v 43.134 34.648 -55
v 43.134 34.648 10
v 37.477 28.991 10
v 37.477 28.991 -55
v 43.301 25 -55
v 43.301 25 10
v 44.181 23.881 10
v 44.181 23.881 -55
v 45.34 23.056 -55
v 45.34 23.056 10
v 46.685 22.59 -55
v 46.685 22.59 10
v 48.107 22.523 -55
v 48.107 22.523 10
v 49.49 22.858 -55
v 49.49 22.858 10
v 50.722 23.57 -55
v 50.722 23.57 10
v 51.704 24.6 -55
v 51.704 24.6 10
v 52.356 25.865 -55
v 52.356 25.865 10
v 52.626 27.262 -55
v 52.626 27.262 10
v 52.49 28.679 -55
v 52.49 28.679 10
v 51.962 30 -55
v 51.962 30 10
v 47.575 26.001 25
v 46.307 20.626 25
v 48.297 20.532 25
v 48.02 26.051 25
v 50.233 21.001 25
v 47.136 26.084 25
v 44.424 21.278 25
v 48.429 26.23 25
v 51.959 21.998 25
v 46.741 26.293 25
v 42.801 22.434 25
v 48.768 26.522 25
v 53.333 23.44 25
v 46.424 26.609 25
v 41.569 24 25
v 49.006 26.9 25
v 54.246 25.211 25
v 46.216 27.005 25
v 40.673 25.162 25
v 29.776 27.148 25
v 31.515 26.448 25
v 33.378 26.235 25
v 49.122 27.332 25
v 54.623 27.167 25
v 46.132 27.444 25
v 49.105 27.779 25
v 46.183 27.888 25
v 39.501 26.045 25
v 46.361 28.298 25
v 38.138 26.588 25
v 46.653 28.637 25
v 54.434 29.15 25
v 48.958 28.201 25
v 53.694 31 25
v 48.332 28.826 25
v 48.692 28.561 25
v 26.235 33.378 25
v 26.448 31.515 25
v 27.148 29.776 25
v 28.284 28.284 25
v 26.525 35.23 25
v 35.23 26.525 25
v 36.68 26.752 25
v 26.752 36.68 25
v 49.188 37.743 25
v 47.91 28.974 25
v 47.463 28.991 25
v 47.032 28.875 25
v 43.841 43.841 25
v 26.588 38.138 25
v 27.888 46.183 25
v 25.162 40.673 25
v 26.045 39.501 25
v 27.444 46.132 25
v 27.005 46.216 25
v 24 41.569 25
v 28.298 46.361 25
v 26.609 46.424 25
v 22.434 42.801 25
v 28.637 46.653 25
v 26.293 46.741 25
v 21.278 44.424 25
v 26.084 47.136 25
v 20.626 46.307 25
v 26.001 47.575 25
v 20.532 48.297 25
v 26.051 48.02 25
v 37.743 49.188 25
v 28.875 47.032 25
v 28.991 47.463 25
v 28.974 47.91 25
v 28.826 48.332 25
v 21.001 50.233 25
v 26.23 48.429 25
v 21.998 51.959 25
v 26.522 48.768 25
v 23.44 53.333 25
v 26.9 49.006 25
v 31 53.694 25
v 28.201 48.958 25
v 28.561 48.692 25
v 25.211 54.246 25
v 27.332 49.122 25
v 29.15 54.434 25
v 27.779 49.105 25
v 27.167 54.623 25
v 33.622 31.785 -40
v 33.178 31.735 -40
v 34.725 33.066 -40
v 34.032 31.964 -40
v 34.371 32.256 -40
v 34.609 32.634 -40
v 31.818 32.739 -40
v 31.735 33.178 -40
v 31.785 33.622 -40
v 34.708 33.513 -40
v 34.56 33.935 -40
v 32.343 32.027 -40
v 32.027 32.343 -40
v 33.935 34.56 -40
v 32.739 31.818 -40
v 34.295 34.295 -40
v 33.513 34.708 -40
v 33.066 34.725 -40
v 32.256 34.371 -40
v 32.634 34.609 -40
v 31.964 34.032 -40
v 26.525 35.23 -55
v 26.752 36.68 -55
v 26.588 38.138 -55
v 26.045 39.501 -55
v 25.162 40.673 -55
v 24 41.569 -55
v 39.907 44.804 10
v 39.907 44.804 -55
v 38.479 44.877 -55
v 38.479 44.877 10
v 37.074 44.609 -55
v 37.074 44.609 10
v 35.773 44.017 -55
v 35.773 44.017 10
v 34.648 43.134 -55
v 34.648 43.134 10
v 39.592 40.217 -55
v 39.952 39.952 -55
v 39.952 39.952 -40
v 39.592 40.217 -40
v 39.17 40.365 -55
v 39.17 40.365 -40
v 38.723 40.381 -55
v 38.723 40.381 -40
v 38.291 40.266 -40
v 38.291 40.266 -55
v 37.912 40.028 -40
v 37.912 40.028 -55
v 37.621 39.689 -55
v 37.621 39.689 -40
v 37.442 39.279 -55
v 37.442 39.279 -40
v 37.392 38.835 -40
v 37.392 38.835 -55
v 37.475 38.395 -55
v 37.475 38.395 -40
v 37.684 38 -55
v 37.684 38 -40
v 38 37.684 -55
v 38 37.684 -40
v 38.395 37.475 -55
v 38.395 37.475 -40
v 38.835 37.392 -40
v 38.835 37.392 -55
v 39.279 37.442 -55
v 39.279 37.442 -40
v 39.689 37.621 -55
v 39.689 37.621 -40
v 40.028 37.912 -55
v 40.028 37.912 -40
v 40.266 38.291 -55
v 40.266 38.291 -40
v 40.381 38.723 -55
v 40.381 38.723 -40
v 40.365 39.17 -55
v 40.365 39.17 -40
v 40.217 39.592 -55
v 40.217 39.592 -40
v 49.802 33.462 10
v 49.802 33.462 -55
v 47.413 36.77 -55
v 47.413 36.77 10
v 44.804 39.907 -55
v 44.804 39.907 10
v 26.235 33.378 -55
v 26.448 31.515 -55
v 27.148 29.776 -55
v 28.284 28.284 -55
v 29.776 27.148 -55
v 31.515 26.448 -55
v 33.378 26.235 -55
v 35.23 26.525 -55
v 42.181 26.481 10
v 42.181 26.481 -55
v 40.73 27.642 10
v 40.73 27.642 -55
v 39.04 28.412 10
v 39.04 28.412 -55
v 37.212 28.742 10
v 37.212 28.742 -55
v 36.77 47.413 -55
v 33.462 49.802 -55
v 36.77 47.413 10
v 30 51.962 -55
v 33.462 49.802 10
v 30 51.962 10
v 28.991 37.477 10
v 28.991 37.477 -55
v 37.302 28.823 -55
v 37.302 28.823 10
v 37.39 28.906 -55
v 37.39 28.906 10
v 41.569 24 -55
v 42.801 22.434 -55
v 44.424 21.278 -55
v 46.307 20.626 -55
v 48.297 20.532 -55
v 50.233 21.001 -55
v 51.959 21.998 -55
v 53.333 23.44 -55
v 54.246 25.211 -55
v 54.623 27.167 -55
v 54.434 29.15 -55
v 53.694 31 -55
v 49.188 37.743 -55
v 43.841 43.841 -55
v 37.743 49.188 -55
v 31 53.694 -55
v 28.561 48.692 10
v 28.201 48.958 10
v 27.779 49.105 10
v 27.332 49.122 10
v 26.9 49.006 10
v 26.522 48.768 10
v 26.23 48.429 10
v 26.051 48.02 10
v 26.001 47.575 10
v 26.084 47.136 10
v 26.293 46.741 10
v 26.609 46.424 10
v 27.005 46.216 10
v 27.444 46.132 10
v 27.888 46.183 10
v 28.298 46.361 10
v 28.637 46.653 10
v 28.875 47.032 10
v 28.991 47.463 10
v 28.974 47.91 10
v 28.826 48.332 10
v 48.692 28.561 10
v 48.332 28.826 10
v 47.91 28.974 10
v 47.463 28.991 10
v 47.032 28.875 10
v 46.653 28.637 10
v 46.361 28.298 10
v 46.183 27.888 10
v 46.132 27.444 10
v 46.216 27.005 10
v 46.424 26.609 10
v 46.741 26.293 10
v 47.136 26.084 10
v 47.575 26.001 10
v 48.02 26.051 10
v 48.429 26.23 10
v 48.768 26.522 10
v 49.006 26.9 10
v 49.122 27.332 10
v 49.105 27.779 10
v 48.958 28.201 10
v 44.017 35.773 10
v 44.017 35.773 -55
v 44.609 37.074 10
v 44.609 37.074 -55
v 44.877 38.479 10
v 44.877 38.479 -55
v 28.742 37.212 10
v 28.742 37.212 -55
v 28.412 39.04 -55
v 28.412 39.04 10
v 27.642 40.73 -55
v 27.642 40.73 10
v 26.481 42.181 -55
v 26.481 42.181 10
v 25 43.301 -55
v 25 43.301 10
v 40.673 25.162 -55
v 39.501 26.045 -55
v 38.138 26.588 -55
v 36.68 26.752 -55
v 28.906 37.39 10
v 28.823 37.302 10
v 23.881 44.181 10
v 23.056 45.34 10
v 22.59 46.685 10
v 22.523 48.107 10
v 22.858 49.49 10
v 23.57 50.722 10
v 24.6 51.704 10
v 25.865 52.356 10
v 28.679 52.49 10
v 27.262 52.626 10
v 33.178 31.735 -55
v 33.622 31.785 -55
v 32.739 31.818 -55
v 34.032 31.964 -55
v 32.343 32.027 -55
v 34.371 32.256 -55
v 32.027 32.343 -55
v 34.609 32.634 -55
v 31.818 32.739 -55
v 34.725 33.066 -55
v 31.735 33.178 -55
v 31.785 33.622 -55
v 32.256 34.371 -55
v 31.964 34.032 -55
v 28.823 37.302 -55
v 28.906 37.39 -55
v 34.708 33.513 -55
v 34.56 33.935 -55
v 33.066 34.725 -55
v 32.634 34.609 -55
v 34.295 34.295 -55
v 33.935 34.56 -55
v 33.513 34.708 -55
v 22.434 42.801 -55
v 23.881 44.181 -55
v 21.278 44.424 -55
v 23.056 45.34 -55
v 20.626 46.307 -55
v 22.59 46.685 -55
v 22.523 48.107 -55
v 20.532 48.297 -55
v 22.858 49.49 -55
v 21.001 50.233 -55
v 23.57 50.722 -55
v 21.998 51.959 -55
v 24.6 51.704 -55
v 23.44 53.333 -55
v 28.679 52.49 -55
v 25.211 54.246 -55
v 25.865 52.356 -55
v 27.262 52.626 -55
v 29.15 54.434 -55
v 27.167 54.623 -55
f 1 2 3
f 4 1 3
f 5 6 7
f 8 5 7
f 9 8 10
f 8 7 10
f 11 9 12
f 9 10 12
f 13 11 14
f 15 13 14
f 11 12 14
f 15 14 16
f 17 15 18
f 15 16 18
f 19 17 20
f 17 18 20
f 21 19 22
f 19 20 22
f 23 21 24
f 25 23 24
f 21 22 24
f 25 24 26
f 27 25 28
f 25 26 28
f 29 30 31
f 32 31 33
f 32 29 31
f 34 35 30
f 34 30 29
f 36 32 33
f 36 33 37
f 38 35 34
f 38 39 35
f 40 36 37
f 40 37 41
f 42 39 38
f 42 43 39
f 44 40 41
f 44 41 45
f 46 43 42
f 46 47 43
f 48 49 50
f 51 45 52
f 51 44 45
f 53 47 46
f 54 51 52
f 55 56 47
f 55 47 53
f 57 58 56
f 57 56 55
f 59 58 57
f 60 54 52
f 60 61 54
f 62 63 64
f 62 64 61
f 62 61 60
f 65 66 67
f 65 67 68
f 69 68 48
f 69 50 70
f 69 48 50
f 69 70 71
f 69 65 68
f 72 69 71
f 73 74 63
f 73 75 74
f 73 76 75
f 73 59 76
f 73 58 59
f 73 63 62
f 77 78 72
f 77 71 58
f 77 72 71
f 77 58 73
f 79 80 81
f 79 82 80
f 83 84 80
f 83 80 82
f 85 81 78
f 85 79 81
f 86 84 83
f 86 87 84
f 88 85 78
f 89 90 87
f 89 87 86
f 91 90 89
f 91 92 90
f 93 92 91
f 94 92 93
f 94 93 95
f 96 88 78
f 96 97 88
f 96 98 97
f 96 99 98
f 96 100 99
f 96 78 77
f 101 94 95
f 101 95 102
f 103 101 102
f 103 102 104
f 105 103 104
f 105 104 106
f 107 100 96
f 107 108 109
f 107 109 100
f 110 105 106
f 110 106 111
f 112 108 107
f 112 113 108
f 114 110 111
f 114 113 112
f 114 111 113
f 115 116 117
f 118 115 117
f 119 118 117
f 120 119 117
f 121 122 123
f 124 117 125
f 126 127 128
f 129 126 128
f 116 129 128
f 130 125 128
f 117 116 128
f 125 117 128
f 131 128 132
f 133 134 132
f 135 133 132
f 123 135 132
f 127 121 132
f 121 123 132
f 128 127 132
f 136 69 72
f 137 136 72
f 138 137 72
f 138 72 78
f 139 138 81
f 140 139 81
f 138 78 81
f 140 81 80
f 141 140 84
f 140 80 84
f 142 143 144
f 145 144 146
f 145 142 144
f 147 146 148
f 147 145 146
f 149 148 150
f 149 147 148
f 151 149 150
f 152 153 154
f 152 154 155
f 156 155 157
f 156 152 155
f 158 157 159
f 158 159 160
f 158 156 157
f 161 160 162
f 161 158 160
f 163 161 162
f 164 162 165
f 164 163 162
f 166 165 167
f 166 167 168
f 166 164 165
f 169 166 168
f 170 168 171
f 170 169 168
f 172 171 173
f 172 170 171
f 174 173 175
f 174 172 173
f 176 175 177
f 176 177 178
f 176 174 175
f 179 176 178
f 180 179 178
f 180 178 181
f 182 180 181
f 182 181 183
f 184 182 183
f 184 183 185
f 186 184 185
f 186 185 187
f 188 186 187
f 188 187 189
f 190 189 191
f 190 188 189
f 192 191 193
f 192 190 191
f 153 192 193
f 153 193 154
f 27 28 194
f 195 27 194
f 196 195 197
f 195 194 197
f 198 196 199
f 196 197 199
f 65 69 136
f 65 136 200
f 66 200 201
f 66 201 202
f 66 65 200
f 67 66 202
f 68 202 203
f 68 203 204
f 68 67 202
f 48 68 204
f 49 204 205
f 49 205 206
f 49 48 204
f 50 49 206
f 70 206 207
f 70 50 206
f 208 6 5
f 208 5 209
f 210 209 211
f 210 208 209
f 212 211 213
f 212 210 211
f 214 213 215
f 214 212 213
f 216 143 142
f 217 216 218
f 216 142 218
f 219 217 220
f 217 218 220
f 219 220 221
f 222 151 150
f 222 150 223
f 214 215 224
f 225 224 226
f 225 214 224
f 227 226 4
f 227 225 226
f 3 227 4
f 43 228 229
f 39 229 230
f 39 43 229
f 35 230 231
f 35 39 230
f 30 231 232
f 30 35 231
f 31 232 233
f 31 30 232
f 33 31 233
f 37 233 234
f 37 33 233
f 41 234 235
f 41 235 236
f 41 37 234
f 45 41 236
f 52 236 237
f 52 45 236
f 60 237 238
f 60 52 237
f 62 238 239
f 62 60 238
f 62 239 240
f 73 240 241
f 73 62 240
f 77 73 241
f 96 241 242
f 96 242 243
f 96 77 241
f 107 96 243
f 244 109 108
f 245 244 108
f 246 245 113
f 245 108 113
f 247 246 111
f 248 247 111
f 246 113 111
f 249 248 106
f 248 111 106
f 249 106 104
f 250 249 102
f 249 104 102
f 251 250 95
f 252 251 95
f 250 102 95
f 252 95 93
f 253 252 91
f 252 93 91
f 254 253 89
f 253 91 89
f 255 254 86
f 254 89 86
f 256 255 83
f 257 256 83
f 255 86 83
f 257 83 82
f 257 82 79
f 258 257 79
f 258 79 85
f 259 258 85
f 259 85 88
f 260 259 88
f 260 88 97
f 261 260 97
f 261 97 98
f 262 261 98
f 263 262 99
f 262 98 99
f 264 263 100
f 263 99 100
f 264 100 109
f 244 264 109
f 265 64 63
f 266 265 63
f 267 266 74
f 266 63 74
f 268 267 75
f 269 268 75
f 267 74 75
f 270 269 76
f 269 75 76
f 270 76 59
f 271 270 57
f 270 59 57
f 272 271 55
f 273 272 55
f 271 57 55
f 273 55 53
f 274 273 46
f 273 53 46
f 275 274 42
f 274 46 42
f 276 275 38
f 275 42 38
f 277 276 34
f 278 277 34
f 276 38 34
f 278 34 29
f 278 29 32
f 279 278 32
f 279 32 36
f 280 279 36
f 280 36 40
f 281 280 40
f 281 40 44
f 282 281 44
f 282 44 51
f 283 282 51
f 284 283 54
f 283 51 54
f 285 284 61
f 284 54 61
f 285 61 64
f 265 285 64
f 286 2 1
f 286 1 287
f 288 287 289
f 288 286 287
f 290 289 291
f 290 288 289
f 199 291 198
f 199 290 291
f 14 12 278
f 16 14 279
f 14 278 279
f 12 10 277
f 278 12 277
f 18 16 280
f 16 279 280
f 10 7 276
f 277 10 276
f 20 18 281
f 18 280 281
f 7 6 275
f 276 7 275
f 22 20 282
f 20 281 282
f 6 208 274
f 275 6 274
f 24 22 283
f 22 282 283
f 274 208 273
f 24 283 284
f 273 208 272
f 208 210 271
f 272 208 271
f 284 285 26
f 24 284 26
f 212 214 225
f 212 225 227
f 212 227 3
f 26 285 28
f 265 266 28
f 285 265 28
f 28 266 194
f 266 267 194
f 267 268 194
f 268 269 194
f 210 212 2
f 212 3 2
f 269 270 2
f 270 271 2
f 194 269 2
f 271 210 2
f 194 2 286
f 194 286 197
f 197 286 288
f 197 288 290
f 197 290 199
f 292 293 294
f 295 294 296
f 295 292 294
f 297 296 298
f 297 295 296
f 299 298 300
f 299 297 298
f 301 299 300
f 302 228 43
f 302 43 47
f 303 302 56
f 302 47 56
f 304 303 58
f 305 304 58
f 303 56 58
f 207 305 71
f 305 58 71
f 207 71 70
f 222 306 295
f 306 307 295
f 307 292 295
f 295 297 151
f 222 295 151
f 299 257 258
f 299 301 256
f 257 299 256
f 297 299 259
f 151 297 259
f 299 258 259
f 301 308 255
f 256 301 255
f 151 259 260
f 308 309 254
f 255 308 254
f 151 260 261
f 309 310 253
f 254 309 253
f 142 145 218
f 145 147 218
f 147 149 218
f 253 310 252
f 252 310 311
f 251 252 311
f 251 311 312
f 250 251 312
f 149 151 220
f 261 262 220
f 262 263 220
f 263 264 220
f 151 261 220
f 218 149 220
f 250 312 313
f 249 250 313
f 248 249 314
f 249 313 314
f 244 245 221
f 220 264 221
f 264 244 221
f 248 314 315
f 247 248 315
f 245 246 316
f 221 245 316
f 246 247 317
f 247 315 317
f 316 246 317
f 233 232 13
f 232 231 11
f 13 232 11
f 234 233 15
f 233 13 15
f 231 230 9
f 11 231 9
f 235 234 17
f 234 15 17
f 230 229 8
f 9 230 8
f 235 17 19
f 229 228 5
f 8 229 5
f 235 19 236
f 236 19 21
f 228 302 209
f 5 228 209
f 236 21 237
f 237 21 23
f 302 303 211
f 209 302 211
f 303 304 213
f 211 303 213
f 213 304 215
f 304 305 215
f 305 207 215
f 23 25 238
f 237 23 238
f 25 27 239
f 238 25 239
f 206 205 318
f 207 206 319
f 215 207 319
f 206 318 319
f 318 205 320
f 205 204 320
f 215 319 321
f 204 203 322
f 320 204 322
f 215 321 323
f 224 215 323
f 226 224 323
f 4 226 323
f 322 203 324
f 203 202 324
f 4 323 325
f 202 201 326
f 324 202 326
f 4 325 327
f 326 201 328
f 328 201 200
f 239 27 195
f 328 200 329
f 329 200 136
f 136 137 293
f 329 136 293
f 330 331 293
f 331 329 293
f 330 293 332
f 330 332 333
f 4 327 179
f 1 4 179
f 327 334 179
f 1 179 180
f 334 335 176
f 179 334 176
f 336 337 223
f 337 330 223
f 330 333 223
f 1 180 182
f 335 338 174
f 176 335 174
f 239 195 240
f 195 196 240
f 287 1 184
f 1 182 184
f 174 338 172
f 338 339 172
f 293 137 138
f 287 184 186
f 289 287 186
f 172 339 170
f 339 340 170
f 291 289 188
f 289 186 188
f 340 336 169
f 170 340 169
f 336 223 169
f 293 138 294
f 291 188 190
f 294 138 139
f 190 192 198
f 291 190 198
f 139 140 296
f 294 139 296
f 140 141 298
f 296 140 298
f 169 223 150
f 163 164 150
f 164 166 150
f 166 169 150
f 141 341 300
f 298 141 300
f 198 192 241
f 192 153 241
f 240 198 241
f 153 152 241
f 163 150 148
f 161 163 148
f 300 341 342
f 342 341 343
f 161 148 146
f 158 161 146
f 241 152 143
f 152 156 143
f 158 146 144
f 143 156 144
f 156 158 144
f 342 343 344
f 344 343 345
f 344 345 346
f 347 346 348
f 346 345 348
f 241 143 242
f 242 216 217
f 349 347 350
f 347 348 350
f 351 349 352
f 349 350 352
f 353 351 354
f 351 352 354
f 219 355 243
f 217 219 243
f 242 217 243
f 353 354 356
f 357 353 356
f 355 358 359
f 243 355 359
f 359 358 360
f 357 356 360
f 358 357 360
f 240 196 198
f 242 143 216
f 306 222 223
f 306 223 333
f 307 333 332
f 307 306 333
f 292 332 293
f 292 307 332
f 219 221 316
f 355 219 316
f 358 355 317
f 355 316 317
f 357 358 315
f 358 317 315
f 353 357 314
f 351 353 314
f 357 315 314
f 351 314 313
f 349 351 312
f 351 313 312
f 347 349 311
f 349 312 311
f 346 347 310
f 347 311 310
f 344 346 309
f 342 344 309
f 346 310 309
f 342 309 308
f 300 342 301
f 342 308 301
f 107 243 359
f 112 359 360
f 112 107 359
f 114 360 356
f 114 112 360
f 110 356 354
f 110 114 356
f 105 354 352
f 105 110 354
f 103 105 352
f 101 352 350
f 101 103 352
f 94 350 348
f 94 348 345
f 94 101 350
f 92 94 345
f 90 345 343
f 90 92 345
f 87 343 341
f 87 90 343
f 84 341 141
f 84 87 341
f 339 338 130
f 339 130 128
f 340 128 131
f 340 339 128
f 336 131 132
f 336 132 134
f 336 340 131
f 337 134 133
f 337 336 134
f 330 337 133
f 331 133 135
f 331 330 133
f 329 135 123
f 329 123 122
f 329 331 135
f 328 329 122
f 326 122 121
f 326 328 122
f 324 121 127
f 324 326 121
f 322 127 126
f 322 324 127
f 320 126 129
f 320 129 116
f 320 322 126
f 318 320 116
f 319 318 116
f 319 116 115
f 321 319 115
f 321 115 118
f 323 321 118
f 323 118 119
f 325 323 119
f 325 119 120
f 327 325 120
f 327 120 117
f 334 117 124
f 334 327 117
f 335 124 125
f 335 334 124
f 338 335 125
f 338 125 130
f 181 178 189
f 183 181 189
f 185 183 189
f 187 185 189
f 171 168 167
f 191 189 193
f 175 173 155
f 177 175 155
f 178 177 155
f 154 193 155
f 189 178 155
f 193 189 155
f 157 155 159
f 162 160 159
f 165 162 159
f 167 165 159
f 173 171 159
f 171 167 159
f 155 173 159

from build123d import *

# Parameters (mm, degrees)
SKETCH020_R             = 1.5
PAD013_DEPTH            = 15
PAD014_DEPTH            = 80
PAD015_DEPTH            = 80
SKETCH023_R             = 1.5
POCKET005_DEPTH         = 15
BODY003_PLACEMENT_ANGLE = 45


with BuildPart() as part:
    # Sketch020 → Pad013 (new body)
    with BuildSketch(Plane.XY):
        with BuildLine():
            ThreePointArc((59.887401, -16.046781), (62, 0), (59.887401, 16.046781))
            ThreePointArc((59.887401, 16.046781), (51.314187, 20.996528), (46.36444, 12.423314))
            ThreePointArc((43.66723, 6.1557), (46.103592, 8.821401), (46.36444, 12.423314))
            ThreePointArc((43.66723, 6.1557), (40, 0), (43.66723, -6.1557))
            ThreePointArc((46.36444, -12.423314), (46.103592, -8.821401), (43.66723, -6.1557))
            ThreePointArc((46.36444, -12.423314), (51.314187, -20.996528), (59.887401, -16.046781))
        make_face()
        with Locations((53.12592, 14.235047)):
            Circle(SKETCH020_R, mode=Mode.SUBTRACT)
        with Locations((53.12592, -14.235047)):
            Circle(SKETCH020_R, mode=Mode.SUBTRACT)
    extrude(amount=-PAD013_DEPTH)

    # Sketch021 → Pad014 (join)
    with BuildSketch(Plane.XY):
        with BuildLine():
            ThreePointArc((59.887401, -16.046781), (62, 0), (59.887401, 16.046781))
            ThreePointArc((59.887401, 16.046781), (51.314187, 20.996528), (46.36444, 12.423314))
            ThreePointArc((43.66723, 6.1557), (46.103592, 8.821401), (46.36444, 12.423314))
            ThreePointArc((43.66723, 6.1557), (40, 0), (43.66723, -6.1557))
            ThreePointArc((46.36444, -12.423314), (46.103592, -8.821401), (43.66723, -6.1557))
            ThreePointArc((46.36444, -12.423314), (51.314187, -20.996528), (59.887401, -16.046781))
        make_face()
        with BuildLine():
            ThreePointArc((57.95555, 15.529143), (51.831825, 19.064677), (48.296291, 12.940952))
            ThreePointArc((44.61945, 4.396929), (47.940703, 8.030817), (48.296291, 12.940952))
            ThreePointArc((44.61945, 4.396929), (42, 0), (44.61945, -4.396929))
            ThreePointArc((48.296291, -12.940952), (47.940703, -8.030817), (44.61945, -4.396929))
            ThreePointArc((48.296291, -12.940952), (51.831825, -19.064677), (57.95555, -15.529143))
            ThreePointArc((57.95555, -15.529143), (60, 0), (57.95555, 15.529143))
        make_face(mode=Mode.SUBTRACT)
    extrude(amount=-PAD014_DEPTH)

    # Sketch022 → Pad015 (join)
    with BuildSketch(Plane.XY):
        with BuildLine():
            ThreePointArc((55, -6), (61, 0), (55, 6))
            Line((55, 6), (47, 6))
            ThreePointArc((47, 6), (41, 0), (47, -6))
            Line((55, -6), (47, -6))
        make_face()
    extrude(amount=-PAD015_DEPTH)

    # Sketch023 → Pocket005 (cut)
    with BuildSketch(Plane.XY.offset(-80)):
        with Locations((47, 0)):
            Circle(SKETCH023_R)
        with Locations((55, 0)):
            Circle(SKETCH023_R)
    extrude(amount=POCKET005_DEPTH, mode=Mode.SUBTRACT)


with BuildPart() as part_1:
    # Body003 placement: moved
    add(part.part.moved(Location((0, 0, 25))).rotate(Axis((0, 0, 25), (0, 0, 1)), BODY003_PLACEMENT_ANGLE))


solid = part_1.part
